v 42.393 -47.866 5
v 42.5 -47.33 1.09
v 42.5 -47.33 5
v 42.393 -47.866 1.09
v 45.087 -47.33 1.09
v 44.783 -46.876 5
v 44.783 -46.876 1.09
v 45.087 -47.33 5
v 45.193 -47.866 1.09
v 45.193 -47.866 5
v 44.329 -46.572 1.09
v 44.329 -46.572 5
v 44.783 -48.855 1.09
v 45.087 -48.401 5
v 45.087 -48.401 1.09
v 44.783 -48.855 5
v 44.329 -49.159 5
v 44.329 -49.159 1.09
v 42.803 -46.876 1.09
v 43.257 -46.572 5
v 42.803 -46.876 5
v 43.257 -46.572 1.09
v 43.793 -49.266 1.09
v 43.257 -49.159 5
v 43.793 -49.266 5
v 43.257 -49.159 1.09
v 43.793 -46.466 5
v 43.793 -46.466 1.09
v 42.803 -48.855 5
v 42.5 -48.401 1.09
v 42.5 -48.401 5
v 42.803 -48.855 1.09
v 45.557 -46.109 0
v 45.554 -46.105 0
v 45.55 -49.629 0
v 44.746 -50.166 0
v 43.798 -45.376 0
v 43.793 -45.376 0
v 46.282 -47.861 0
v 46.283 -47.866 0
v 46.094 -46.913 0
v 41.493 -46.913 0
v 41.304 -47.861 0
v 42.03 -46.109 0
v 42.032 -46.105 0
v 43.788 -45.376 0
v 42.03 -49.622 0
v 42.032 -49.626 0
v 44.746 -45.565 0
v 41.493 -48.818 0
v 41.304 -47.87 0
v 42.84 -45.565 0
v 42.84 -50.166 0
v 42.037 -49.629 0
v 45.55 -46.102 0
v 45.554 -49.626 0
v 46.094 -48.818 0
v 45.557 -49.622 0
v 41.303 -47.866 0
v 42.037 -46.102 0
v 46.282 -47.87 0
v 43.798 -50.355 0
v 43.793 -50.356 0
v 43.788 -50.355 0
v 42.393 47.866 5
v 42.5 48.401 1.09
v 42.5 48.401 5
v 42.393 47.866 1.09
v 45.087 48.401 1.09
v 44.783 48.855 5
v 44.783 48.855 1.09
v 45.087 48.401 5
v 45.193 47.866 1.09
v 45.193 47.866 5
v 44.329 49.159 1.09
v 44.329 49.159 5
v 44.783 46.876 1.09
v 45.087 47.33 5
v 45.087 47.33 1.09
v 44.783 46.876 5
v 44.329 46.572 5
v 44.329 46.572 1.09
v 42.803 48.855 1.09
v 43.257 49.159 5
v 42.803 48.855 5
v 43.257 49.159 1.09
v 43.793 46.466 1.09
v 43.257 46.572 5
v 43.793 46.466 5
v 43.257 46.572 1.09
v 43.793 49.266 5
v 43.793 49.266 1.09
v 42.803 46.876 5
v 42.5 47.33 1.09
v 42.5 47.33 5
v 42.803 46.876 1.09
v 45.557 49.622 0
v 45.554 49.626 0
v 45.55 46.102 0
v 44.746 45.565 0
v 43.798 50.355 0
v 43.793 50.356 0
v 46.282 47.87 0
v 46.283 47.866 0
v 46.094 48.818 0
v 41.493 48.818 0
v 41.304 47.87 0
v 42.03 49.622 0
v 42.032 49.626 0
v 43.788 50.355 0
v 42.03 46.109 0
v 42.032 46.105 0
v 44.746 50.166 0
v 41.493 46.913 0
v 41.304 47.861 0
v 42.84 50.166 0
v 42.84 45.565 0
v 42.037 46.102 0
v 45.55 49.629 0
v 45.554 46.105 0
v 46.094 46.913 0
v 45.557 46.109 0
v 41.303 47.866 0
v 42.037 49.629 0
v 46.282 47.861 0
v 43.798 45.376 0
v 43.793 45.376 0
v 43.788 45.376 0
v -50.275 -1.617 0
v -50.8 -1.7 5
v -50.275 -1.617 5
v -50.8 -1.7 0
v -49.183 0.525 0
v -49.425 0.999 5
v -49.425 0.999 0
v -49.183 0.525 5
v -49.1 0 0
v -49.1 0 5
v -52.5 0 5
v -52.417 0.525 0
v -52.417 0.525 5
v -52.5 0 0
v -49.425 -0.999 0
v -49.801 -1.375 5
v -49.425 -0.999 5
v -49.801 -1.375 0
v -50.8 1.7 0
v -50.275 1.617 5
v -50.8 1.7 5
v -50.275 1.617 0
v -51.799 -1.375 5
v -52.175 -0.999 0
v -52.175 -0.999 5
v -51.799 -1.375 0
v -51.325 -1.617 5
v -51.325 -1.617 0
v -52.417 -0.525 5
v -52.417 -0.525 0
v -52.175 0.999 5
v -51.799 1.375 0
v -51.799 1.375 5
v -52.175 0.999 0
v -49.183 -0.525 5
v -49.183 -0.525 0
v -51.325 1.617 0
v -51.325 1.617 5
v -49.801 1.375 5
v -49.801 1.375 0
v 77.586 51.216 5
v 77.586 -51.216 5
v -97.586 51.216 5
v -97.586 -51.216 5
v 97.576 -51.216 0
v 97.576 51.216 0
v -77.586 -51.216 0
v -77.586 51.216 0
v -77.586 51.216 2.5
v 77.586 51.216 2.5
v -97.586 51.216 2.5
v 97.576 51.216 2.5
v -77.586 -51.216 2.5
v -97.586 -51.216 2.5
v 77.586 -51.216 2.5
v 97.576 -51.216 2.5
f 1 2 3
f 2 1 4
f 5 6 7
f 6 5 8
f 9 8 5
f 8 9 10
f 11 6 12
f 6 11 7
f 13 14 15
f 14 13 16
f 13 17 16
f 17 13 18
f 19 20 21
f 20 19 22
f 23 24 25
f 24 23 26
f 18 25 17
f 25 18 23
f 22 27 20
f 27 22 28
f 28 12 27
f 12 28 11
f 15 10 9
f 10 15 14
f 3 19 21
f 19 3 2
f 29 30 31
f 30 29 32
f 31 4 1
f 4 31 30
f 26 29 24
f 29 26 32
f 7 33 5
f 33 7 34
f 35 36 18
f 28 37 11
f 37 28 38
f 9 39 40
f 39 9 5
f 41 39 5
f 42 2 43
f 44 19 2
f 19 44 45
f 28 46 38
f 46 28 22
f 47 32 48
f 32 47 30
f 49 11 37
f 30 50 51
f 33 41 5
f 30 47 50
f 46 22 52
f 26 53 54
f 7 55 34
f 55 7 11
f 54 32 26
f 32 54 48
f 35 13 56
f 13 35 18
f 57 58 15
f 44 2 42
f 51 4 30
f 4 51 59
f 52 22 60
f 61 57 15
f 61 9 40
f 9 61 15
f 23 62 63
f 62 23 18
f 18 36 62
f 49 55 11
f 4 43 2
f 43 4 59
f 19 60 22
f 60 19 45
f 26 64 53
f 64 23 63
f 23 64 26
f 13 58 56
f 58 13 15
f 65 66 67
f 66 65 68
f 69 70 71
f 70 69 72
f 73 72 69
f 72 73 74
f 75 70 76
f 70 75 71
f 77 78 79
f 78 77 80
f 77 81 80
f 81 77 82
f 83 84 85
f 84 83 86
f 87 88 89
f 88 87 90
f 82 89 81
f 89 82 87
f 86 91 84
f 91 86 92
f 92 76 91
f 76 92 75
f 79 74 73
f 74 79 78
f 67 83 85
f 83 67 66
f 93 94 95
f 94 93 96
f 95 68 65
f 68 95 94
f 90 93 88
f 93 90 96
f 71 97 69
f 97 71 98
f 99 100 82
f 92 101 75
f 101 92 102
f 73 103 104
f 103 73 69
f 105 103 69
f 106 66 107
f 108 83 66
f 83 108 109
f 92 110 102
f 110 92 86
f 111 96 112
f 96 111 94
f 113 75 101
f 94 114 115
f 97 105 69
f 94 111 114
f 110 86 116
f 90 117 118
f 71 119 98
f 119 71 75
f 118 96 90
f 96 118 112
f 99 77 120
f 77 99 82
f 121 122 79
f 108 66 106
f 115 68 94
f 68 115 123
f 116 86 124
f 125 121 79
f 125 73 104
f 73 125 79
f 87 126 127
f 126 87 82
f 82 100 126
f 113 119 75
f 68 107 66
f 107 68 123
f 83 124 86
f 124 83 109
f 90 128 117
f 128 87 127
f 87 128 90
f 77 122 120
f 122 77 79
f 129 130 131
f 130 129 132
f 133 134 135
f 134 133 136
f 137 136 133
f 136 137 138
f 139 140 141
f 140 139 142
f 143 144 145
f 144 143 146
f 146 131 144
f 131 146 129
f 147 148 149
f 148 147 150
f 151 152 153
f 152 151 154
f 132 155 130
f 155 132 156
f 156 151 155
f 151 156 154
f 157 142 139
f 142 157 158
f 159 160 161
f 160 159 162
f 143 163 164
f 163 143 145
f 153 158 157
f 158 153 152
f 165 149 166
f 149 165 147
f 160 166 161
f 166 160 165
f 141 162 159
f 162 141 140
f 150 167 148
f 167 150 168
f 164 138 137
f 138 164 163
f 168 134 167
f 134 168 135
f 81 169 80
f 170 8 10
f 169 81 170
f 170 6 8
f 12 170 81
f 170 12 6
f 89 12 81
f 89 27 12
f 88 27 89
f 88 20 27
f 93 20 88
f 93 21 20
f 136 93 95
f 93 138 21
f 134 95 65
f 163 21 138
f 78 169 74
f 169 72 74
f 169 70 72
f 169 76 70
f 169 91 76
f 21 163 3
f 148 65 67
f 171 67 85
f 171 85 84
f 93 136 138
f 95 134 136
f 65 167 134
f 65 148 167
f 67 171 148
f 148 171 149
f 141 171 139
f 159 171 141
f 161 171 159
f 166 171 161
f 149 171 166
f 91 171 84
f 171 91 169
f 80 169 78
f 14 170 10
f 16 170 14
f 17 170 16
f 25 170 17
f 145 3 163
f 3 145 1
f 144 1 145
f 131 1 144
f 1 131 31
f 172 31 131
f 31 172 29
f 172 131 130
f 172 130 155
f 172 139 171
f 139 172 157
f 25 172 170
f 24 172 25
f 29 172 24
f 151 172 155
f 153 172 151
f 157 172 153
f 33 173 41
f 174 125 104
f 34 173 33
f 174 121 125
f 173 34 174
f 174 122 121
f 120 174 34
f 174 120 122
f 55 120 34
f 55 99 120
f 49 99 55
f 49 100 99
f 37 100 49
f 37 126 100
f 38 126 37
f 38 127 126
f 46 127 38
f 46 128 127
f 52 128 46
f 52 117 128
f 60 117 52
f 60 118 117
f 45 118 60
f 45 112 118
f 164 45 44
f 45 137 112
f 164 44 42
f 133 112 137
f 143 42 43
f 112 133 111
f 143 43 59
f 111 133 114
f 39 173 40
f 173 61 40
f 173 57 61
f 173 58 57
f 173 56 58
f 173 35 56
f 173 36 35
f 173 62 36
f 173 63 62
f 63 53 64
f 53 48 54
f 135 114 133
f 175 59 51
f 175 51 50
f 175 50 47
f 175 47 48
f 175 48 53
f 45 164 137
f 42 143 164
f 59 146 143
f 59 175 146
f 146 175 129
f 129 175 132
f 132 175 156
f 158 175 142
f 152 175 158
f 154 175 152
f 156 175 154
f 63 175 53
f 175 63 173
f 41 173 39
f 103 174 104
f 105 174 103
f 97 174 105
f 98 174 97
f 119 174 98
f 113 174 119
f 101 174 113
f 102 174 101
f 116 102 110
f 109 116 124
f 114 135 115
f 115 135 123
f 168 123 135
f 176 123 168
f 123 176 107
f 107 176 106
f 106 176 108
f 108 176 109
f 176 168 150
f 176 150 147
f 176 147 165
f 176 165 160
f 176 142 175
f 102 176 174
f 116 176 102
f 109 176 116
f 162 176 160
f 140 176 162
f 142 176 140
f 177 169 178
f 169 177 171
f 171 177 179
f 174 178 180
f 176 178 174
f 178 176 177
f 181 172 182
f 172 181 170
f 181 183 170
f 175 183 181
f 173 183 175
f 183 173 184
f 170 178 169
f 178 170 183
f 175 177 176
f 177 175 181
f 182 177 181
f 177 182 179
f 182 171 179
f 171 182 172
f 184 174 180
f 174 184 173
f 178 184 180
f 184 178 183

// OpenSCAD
// file: ../../library/e7_all.scad
// ==========================================================================
//  e7_all.scad - include this one file. Preview, print plates and the report.
// ==========================================================================
include <e7_params.scad>
include <e7_body.scad>

// whole painted loco
module e7_preview() {
  // carbody in its paint bands
  for (i = [0:len(PAINT_BANDS) - 1]) {
    z0 = i == 0 ? -1 : p(PAINT_BANDS[i - 1][0]);
    z1 = i == len(PAINT_BANDS) - 1 ? 1000 : p(PAINT_BANDS[i][0]);
    color(PAINT_BANDS[i][1]) render(convexity = 8) e7_shell_solid([z0, z1]);
  }
  color(C_GLASS) e7_glass();
  color(C_LENS) let (d = nose_d_at_z(HEADLIGHT[0]))
    translate([XF - p(d) + p(HEADLIGHT[2]) + p(1.5), 0, p(HEADLIGHT[0])]) rotate([0, 90, 0]) cylinder(d = p(HEADLIGHT[1]) - 0.8, h = 0.5, $fn = 32);
  color(C_FRAME) { for (j = [1:NFRAME]) e7_frame_piece(j); e7_pilot(); e7_pilot_rear(); }
  for (tx = [TRK_X, -TRK_X]) translate([tx, 0, 0]) { color(C_TRUCK) e7_truck_frame(); color(C_WHEEL) e7_wheels(); }
}
// thin glass panes sitting in the window pockets (preview only)
module e7_glass() {
  intersection() { e7_loft(DET * 0.6); union() { e7_windshield_cut(); e7_side_cuts_windows_only(); } }
}
module e7_side_cuts_windows_only() {
  for (s = [-1, 1], w = CAB_WIN)
    translate([XF - p(w[1]), s * HW - (s > 0 ? DET : 3 - DET), p(w[2])]) cube([p(w[1] - w[0]), 3, p(w[3] - w[2])]);
}

// one print, laid out for the printer
module e7_plate(part) {
  sec = [for (k = [1:NSEC]) str("body_", k)];
  frm = [for (j = [1:NFRAME]) str("frame_", j)];
  if (is_num(search([part], sec)[0])) {
    k = search([part], sec)[0] + 1;
    // stand the section on its open bottom (skirt edge on the bed)
    translate([-sec_x0(k) - SEC_L / 2, 0, -Z_SKIRT]) e7_body_section(k);
  } else if (is_num(search([part], frm)[0])) {
    j = search([part], frm)[0] + 1;
    xs = concat([FRAME_X0], FRAME_SPLITS, [FRAME_X1]);
    translate([-(xs[j - 1] + xs[j]) / 2, 0, -Z_FRAME_BOT]) e7_frame_piece(j);
  } else if (part == "pilot") {
    translate([-XF, 0, 0]) rotate([0, 0, 0]) translate([0, 0, -p(5)]) e7_pilot();
  } else if (part == "pilot_rear") {
    translate([-XR, 0, 0]) translate([0, 0, -(CPL_Z - CPL_H / 2 - WALL)]) e7_pilot_rear();
  } else if (part == "truck") {
    // upside down, bolster on the bed
    translate([0, 0, Z_FRAME_BOT - 0.3]) rotate([180, 0, 0]) e7_truck_frame();
  } else {
    assert(false, str("unknown part '", part, "'"));
  }
}

module e7_report() {
  echo(str("MILW E7A ", ROAD_NO, " class ", CLASS, " - ", SC, " scale 1:", RATIO, ", paint ", PAINT));
  echo(str("  carbody ", round(BL), " mm long, ", round(2 * HW), " mm wide, roof ", round(Z_ROOF), " mm, cab ", round(Z_CAB), " mm above rail"));
  echo(str("  ", NSEC, " body sections of ", round(SEC_L), " mm; ", NFRAME, " frame pieces; trucks at +/- ", round(TRK_X), " mm"));
  echo(str("  body screws ", SCREW_BODY_NAME, " x ", 2 * len(BOSS_X), "; truck pivots ", PIVOT[1], "; wheels ", round(WHEEL_D * 10) / 10, " mm (bought)"));
}
// main file
// Milwaukee Road E7A, G scale 1-29 - print 6 of 12: frame_2 - frame plate piece 2 (print flat)
// Render (F6), export STL, print. Settings: ../../library/e7_params.scad
// Whole loco preview and notes: ../../MILW_E7_Main.scad
SCALE_SEL = "G";
include <../../library/e7_all.scad>
e7_plate("frame_2");
